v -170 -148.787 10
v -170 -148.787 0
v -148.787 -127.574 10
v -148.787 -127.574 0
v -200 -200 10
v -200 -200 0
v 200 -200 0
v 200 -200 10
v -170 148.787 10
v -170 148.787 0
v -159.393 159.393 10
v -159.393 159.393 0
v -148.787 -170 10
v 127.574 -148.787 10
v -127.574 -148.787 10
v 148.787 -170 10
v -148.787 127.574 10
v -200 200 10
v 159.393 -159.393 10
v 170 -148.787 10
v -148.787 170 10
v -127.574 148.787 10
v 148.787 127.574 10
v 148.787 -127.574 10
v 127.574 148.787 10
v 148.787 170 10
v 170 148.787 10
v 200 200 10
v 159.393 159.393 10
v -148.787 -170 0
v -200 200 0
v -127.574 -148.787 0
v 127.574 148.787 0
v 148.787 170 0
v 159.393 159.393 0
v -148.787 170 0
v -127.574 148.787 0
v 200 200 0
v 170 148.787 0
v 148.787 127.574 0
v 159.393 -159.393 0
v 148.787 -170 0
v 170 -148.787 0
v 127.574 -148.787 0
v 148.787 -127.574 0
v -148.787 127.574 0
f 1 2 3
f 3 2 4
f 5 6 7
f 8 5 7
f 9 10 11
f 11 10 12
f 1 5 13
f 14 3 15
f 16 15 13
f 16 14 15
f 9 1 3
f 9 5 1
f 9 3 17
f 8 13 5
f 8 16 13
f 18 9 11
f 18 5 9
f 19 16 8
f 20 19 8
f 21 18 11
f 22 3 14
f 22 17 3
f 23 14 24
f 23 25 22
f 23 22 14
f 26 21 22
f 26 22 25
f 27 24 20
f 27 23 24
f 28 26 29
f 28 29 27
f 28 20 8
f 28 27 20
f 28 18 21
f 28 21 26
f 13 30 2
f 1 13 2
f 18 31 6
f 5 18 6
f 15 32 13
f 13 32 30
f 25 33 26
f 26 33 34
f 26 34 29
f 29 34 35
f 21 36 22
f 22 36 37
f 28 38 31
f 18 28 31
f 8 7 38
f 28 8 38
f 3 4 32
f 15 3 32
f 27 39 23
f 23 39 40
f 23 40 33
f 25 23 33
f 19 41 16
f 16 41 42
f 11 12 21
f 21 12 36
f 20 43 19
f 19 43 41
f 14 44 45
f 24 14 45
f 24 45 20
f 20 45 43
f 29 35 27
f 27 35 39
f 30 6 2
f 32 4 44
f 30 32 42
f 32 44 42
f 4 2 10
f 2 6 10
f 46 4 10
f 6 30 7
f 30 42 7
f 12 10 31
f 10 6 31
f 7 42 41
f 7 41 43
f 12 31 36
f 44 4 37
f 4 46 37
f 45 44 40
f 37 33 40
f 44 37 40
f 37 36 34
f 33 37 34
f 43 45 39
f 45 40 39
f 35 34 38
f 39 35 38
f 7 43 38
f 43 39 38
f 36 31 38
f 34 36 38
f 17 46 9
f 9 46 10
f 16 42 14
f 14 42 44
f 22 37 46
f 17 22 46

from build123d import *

# Parameters (mm, degrees)
F1_DEPTH = 10


with BuildPart() as f1:
    # F0 (on Top) → F1 (new body)
    with BuildSketch(Plane.XY):
        Polygon((200, 0), (200, 200), (-200, 200), (-159.393398, 159.393398), (-148.786797, 170), (-127.573593, 148.786797), (-138.180195, 138.180195), (0, 0), align=None)
        Polygon((148.786797, 170), (159.393398, 159.393398), (170, 148.786797), (148.786797, 127.573593), (127.573593, 148.786797), align=None, mode=Mode.SUBTRACT)
        Polygon((-159.393398, 159.393398), (-200, 200), (-200, 0), (0, 0), (-138.180195, 138.180195), (-148.786797, 127.573593), (-170, 148.786797), align=None)
        Polygon((0, 0), (-200, 0), (-200, -200), (200, -200), (159.393398, -159.393398), (148.786797, -170), (127.573593, -148.786797), (138.180195, -138.180195), align=None)
        Polygon((-170, -148.786797), (-148.786797, -127.573593), (-127.573593, -148.786797), (-148.786797, -170), align=None, mode=Mode.SUBTRACT)
        Polygon((200, -200), (200, 0), (0, 0), (138.180195, -138.180195), (148.786797, -127.573593), (170, -148.786797), (159.393398, -159.393398), align=None)
    extrude(amount=F1_DEPTH)


solid = f1.part
